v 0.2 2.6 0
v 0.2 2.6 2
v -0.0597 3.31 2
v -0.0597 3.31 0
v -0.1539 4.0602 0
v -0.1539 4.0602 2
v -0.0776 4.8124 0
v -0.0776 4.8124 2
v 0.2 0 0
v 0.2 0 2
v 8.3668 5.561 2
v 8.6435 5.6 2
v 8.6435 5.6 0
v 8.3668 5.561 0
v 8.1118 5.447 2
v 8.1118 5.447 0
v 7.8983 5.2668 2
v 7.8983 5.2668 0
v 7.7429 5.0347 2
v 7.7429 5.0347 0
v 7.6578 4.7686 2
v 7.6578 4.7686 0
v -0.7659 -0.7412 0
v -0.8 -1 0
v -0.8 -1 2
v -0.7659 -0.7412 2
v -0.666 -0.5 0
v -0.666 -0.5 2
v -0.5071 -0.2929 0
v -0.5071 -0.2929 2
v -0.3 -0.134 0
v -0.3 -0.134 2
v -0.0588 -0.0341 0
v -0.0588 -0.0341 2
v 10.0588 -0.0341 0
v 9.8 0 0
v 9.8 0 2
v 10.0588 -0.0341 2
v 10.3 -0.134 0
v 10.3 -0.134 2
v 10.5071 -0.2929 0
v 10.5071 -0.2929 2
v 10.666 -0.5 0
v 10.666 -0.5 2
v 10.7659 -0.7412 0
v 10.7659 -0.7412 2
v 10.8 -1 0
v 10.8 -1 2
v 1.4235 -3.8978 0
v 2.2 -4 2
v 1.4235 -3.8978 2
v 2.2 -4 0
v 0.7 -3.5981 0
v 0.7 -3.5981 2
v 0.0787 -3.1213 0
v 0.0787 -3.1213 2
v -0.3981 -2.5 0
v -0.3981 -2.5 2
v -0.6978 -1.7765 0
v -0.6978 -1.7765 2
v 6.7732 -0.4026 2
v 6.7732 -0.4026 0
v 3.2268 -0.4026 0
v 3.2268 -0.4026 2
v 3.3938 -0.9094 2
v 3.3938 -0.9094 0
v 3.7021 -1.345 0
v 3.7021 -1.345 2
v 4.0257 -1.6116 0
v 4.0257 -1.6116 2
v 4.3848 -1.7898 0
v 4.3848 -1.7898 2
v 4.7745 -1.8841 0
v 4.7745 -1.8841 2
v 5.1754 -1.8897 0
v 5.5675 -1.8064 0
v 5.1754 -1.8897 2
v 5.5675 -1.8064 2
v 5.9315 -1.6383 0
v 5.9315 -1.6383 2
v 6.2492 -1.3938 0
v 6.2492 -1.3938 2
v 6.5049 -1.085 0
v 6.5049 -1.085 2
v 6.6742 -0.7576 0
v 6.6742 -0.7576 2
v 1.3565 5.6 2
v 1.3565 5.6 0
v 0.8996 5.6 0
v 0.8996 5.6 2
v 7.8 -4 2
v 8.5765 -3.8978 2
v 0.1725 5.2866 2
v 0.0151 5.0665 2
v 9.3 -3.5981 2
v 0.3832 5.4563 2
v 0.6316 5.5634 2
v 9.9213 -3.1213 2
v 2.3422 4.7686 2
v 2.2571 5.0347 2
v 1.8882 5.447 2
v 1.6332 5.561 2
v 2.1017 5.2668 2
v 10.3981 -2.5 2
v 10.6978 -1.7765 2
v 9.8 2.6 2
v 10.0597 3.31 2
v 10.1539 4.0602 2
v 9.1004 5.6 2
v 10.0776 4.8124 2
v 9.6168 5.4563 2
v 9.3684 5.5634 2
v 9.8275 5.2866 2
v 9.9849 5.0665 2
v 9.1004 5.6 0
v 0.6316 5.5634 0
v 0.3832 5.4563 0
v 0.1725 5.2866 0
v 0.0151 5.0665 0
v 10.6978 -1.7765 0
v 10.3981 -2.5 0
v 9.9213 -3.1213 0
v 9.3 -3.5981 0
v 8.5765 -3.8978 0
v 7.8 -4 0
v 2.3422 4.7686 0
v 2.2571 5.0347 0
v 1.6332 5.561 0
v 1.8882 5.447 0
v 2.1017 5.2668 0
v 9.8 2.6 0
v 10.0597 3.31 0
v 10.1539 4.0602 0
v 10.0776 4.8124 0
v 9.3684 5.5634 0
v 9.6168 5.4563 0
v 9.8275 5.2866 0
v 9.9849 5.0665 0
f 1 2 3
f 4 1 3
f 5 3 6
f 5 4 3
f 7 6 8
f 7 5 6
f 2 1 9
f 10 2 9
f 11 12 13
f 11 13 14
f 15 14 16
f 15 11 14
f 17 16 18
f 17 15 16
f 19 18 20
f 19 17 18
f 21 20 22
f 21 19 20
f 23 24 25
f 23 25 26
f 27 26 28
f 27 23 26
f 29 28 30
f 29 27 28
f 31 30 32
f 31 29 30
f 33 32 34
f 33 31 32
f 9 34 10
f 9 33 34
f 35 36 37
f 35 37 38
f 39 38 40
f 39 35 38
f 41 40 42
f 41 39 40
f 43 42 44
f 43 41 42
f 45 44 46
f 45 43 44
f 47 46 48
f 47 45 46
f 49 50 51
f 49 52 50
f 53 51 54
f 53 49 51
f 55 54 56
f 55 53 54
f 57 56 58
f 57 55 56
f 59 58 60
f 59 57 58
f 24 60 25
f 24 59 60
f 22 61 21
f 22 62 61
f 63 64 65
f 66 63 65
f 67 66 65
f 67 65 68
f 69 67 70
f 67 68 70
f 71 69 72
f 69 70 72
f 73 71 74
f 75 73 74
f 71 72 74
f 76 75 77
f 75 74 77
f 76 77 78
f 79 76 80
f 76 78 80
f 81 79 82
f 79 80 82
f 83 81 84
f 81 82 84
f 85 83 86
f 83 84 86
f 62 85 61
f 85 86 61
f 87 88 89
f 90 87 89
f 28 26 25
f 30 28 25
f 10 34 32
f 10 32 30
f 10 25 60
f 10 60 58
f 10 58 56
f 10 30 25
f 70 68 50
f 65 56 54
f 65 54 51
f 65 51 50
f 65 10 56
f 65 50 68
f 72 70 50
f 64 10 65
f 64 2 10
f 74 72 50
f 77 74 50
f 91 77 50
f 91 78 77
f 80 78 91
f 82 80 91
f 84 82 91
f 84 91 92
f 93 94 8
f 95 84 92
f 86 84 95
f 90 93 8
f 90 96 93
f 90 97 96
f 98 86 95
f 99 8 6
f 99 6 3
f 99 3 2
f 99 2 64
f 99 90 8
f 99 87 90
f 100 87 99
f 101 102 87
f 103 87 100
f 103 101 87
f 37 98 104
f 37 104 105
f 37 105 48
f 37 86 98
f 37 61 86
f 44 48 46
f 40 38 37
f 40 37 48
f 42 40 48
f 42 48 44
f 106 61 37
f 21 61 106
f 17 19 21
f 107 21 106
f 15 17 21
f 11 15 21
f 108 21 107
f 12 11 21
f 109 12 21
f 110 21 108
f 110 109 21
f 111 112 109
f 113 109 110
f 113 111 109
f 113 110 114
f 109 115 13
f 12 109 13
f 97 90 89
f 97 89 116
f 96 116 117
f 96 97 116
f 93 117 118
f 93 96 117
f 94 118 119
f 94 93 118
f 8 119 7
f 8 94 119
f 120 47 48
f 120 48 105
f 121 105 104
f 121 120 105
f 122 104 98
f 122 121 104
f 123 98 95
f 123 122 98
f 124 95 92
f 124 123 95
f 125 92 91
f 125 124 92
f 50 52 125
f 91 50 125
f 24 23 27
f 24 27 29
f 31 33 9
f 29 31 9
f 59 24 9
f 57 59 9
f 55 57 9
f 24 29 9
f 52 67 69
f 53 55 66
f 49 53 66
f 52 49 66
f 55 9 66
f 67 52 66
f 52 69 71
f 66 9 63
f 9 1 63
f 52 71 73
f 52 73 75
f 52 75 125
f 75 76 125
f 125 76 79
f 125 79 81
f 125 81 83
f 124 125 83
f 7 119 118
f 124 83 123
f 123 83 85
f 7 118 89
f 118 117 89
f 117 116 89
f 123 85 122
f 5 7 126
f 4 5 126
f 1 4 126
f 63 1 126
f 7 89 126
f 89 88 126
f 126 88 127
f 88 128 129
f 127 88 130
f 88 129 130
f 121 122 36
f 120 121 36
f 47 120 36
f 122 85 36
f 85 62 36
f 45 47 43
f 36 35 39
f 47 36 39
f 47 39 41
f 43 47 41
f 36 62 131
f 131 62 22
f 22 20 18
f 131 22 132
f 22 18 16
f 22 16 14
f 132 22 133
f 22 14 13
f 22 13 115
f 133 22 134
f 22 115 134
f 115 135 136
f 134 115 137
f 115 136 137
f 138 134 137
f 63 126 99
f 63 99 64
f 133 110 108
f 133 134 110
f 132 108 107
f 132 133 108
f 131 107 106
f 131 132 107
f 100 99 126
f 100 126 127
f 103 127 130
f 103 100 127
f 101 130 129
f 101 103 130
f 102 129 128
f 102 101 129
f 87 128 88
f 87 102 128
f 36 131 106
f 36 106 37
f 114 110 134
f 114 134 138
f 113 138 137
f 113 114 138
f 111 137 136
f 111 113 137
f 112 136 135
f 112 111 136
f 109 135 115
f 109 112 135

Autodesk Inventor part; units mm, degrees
ref_plane "YZ Plane" through (0, 0, 0) normal (1, 0, 0) x (0, 1, 0)
ref_plane "XZ Plane" through (0, 0, 0) normal (0, 1, 0) x (-1, 0, 0)
ref_plane "XY Plane" through (0, 0, 0) normal (0, 0, 1) x (1, 0, 0)
sketch "lock_sketch" plane through (0, 0, 0) normal (0, 0, 1) x (1, 0, 0)
  line L0 (0, 0) -> (10, 0) projected
  line L1 (10, 0) -> (10, 2.6) projected
  line L2 (0, 2.6) -> (10, 2.6) projected
  line L3 (0, 0) -> (0, 2.6) projected
  line L4 (0.2, -4) -> (9.8, -4) construction
  line L5 (9.8, -4) -> (9.8, 5.6) construction
  line L6 (9.8, 5.6) -> (0.2, 5.6)
  line L7 (0.2, 5.6) -> (0.2, -4) construction
  arc A0 (0.2, 5.6) -> (0.2, 2.6) centre (3.2, 4.1) ccw
  arc A1 (9.8, 2.6) -> (9.8, 5.6) centre (6.8, 4.1) ccw
  line L8 (5, -4) -> (5, 0) construction
  line L9 (9.8, 2.6) -> (9.8, 0)
  line L10 (0.2, 2.6) -> (0.2, 0)
  line L11 (0.2, 0) -> (0.2, 0)
  line L12 (-0.8, -1) -> (-0.8, -1)
  line L13 (2.2, -4) -> (7.8, -4)
  line L14 (10.8, -1) -> (10.8, -1)
  line L15 (9.8, 0) -> (9.8, 0)
  arc A2 (-0.8, -1) -> (2.2, -4) centre (2.2, -1) ccw
  arc A3 (7.8, -4) -> (10.8, -1) centre (7.8, -1) ccw
  arc A4 (0.2, 0) -> (-0.8, -1) centre (0.2, -1) ccw
  arc A5 (10.8, -1) -> (9.8, 0) centre (9.8, -1) ccw
  line L16 (2.2, 5.6) -> (3.5, -2)
  line L17 (3.5, -2) -> (6.5, -2)
  line L18 (6.5, -2) -> (7.8, 5.6)
  point P0 (-0.8, 0)
  point P1 (10.8, 0)
  point P2 (0.2, 0)
  point P3 (9.8, 0)
  point P4 (5, -4)
  dimension "d4" = 0
  dimension "d0" = 10
  dimension "d1" = 9.6
  dimension "d2" = 0.2
  dimension "d6" = 3
  dimension "d7" = 3
  dimension "d9" = 2
  dimension "d10" = 2
  dimension "d14" = 4
  dimension "d17" = 3
  dimension "d18" = 1
  dimension "d19" = 1
  dimension "d22" = 3
  dimension "d23" = 1
  dimension "d24" = 3
  dimension "d25" = 2
extrude "lock" add sketch "lock_sketch" along normal blind 2 contours L10 L2 L16 L0 | L0 L16 L17 L18 A5 A3 L13 A2 A4 | A0 L6 L16 L2 | L18 L2 L9 L0 | L18 L6 A1 L2
fillet "teeth" radius 1 4 edges at (2.2, 5.6, 1) (7.8, 5.6, 1) (0.2, 5.6, 1) (9.8, 5.6, 1)
fillet "inside" radius 1.8 2 edges at (3.5, -2, 1) (6.5, -2, 1)
equation "\"d2\" = -0.5 * d1 + 0.5 * d0"
equation "\"d7\" = d17"
equation "\"d19\" = d18"
equation "\"d25\" = 0.5 * d14"
properties part number "fastener_lock" material "ABS Plastic"
